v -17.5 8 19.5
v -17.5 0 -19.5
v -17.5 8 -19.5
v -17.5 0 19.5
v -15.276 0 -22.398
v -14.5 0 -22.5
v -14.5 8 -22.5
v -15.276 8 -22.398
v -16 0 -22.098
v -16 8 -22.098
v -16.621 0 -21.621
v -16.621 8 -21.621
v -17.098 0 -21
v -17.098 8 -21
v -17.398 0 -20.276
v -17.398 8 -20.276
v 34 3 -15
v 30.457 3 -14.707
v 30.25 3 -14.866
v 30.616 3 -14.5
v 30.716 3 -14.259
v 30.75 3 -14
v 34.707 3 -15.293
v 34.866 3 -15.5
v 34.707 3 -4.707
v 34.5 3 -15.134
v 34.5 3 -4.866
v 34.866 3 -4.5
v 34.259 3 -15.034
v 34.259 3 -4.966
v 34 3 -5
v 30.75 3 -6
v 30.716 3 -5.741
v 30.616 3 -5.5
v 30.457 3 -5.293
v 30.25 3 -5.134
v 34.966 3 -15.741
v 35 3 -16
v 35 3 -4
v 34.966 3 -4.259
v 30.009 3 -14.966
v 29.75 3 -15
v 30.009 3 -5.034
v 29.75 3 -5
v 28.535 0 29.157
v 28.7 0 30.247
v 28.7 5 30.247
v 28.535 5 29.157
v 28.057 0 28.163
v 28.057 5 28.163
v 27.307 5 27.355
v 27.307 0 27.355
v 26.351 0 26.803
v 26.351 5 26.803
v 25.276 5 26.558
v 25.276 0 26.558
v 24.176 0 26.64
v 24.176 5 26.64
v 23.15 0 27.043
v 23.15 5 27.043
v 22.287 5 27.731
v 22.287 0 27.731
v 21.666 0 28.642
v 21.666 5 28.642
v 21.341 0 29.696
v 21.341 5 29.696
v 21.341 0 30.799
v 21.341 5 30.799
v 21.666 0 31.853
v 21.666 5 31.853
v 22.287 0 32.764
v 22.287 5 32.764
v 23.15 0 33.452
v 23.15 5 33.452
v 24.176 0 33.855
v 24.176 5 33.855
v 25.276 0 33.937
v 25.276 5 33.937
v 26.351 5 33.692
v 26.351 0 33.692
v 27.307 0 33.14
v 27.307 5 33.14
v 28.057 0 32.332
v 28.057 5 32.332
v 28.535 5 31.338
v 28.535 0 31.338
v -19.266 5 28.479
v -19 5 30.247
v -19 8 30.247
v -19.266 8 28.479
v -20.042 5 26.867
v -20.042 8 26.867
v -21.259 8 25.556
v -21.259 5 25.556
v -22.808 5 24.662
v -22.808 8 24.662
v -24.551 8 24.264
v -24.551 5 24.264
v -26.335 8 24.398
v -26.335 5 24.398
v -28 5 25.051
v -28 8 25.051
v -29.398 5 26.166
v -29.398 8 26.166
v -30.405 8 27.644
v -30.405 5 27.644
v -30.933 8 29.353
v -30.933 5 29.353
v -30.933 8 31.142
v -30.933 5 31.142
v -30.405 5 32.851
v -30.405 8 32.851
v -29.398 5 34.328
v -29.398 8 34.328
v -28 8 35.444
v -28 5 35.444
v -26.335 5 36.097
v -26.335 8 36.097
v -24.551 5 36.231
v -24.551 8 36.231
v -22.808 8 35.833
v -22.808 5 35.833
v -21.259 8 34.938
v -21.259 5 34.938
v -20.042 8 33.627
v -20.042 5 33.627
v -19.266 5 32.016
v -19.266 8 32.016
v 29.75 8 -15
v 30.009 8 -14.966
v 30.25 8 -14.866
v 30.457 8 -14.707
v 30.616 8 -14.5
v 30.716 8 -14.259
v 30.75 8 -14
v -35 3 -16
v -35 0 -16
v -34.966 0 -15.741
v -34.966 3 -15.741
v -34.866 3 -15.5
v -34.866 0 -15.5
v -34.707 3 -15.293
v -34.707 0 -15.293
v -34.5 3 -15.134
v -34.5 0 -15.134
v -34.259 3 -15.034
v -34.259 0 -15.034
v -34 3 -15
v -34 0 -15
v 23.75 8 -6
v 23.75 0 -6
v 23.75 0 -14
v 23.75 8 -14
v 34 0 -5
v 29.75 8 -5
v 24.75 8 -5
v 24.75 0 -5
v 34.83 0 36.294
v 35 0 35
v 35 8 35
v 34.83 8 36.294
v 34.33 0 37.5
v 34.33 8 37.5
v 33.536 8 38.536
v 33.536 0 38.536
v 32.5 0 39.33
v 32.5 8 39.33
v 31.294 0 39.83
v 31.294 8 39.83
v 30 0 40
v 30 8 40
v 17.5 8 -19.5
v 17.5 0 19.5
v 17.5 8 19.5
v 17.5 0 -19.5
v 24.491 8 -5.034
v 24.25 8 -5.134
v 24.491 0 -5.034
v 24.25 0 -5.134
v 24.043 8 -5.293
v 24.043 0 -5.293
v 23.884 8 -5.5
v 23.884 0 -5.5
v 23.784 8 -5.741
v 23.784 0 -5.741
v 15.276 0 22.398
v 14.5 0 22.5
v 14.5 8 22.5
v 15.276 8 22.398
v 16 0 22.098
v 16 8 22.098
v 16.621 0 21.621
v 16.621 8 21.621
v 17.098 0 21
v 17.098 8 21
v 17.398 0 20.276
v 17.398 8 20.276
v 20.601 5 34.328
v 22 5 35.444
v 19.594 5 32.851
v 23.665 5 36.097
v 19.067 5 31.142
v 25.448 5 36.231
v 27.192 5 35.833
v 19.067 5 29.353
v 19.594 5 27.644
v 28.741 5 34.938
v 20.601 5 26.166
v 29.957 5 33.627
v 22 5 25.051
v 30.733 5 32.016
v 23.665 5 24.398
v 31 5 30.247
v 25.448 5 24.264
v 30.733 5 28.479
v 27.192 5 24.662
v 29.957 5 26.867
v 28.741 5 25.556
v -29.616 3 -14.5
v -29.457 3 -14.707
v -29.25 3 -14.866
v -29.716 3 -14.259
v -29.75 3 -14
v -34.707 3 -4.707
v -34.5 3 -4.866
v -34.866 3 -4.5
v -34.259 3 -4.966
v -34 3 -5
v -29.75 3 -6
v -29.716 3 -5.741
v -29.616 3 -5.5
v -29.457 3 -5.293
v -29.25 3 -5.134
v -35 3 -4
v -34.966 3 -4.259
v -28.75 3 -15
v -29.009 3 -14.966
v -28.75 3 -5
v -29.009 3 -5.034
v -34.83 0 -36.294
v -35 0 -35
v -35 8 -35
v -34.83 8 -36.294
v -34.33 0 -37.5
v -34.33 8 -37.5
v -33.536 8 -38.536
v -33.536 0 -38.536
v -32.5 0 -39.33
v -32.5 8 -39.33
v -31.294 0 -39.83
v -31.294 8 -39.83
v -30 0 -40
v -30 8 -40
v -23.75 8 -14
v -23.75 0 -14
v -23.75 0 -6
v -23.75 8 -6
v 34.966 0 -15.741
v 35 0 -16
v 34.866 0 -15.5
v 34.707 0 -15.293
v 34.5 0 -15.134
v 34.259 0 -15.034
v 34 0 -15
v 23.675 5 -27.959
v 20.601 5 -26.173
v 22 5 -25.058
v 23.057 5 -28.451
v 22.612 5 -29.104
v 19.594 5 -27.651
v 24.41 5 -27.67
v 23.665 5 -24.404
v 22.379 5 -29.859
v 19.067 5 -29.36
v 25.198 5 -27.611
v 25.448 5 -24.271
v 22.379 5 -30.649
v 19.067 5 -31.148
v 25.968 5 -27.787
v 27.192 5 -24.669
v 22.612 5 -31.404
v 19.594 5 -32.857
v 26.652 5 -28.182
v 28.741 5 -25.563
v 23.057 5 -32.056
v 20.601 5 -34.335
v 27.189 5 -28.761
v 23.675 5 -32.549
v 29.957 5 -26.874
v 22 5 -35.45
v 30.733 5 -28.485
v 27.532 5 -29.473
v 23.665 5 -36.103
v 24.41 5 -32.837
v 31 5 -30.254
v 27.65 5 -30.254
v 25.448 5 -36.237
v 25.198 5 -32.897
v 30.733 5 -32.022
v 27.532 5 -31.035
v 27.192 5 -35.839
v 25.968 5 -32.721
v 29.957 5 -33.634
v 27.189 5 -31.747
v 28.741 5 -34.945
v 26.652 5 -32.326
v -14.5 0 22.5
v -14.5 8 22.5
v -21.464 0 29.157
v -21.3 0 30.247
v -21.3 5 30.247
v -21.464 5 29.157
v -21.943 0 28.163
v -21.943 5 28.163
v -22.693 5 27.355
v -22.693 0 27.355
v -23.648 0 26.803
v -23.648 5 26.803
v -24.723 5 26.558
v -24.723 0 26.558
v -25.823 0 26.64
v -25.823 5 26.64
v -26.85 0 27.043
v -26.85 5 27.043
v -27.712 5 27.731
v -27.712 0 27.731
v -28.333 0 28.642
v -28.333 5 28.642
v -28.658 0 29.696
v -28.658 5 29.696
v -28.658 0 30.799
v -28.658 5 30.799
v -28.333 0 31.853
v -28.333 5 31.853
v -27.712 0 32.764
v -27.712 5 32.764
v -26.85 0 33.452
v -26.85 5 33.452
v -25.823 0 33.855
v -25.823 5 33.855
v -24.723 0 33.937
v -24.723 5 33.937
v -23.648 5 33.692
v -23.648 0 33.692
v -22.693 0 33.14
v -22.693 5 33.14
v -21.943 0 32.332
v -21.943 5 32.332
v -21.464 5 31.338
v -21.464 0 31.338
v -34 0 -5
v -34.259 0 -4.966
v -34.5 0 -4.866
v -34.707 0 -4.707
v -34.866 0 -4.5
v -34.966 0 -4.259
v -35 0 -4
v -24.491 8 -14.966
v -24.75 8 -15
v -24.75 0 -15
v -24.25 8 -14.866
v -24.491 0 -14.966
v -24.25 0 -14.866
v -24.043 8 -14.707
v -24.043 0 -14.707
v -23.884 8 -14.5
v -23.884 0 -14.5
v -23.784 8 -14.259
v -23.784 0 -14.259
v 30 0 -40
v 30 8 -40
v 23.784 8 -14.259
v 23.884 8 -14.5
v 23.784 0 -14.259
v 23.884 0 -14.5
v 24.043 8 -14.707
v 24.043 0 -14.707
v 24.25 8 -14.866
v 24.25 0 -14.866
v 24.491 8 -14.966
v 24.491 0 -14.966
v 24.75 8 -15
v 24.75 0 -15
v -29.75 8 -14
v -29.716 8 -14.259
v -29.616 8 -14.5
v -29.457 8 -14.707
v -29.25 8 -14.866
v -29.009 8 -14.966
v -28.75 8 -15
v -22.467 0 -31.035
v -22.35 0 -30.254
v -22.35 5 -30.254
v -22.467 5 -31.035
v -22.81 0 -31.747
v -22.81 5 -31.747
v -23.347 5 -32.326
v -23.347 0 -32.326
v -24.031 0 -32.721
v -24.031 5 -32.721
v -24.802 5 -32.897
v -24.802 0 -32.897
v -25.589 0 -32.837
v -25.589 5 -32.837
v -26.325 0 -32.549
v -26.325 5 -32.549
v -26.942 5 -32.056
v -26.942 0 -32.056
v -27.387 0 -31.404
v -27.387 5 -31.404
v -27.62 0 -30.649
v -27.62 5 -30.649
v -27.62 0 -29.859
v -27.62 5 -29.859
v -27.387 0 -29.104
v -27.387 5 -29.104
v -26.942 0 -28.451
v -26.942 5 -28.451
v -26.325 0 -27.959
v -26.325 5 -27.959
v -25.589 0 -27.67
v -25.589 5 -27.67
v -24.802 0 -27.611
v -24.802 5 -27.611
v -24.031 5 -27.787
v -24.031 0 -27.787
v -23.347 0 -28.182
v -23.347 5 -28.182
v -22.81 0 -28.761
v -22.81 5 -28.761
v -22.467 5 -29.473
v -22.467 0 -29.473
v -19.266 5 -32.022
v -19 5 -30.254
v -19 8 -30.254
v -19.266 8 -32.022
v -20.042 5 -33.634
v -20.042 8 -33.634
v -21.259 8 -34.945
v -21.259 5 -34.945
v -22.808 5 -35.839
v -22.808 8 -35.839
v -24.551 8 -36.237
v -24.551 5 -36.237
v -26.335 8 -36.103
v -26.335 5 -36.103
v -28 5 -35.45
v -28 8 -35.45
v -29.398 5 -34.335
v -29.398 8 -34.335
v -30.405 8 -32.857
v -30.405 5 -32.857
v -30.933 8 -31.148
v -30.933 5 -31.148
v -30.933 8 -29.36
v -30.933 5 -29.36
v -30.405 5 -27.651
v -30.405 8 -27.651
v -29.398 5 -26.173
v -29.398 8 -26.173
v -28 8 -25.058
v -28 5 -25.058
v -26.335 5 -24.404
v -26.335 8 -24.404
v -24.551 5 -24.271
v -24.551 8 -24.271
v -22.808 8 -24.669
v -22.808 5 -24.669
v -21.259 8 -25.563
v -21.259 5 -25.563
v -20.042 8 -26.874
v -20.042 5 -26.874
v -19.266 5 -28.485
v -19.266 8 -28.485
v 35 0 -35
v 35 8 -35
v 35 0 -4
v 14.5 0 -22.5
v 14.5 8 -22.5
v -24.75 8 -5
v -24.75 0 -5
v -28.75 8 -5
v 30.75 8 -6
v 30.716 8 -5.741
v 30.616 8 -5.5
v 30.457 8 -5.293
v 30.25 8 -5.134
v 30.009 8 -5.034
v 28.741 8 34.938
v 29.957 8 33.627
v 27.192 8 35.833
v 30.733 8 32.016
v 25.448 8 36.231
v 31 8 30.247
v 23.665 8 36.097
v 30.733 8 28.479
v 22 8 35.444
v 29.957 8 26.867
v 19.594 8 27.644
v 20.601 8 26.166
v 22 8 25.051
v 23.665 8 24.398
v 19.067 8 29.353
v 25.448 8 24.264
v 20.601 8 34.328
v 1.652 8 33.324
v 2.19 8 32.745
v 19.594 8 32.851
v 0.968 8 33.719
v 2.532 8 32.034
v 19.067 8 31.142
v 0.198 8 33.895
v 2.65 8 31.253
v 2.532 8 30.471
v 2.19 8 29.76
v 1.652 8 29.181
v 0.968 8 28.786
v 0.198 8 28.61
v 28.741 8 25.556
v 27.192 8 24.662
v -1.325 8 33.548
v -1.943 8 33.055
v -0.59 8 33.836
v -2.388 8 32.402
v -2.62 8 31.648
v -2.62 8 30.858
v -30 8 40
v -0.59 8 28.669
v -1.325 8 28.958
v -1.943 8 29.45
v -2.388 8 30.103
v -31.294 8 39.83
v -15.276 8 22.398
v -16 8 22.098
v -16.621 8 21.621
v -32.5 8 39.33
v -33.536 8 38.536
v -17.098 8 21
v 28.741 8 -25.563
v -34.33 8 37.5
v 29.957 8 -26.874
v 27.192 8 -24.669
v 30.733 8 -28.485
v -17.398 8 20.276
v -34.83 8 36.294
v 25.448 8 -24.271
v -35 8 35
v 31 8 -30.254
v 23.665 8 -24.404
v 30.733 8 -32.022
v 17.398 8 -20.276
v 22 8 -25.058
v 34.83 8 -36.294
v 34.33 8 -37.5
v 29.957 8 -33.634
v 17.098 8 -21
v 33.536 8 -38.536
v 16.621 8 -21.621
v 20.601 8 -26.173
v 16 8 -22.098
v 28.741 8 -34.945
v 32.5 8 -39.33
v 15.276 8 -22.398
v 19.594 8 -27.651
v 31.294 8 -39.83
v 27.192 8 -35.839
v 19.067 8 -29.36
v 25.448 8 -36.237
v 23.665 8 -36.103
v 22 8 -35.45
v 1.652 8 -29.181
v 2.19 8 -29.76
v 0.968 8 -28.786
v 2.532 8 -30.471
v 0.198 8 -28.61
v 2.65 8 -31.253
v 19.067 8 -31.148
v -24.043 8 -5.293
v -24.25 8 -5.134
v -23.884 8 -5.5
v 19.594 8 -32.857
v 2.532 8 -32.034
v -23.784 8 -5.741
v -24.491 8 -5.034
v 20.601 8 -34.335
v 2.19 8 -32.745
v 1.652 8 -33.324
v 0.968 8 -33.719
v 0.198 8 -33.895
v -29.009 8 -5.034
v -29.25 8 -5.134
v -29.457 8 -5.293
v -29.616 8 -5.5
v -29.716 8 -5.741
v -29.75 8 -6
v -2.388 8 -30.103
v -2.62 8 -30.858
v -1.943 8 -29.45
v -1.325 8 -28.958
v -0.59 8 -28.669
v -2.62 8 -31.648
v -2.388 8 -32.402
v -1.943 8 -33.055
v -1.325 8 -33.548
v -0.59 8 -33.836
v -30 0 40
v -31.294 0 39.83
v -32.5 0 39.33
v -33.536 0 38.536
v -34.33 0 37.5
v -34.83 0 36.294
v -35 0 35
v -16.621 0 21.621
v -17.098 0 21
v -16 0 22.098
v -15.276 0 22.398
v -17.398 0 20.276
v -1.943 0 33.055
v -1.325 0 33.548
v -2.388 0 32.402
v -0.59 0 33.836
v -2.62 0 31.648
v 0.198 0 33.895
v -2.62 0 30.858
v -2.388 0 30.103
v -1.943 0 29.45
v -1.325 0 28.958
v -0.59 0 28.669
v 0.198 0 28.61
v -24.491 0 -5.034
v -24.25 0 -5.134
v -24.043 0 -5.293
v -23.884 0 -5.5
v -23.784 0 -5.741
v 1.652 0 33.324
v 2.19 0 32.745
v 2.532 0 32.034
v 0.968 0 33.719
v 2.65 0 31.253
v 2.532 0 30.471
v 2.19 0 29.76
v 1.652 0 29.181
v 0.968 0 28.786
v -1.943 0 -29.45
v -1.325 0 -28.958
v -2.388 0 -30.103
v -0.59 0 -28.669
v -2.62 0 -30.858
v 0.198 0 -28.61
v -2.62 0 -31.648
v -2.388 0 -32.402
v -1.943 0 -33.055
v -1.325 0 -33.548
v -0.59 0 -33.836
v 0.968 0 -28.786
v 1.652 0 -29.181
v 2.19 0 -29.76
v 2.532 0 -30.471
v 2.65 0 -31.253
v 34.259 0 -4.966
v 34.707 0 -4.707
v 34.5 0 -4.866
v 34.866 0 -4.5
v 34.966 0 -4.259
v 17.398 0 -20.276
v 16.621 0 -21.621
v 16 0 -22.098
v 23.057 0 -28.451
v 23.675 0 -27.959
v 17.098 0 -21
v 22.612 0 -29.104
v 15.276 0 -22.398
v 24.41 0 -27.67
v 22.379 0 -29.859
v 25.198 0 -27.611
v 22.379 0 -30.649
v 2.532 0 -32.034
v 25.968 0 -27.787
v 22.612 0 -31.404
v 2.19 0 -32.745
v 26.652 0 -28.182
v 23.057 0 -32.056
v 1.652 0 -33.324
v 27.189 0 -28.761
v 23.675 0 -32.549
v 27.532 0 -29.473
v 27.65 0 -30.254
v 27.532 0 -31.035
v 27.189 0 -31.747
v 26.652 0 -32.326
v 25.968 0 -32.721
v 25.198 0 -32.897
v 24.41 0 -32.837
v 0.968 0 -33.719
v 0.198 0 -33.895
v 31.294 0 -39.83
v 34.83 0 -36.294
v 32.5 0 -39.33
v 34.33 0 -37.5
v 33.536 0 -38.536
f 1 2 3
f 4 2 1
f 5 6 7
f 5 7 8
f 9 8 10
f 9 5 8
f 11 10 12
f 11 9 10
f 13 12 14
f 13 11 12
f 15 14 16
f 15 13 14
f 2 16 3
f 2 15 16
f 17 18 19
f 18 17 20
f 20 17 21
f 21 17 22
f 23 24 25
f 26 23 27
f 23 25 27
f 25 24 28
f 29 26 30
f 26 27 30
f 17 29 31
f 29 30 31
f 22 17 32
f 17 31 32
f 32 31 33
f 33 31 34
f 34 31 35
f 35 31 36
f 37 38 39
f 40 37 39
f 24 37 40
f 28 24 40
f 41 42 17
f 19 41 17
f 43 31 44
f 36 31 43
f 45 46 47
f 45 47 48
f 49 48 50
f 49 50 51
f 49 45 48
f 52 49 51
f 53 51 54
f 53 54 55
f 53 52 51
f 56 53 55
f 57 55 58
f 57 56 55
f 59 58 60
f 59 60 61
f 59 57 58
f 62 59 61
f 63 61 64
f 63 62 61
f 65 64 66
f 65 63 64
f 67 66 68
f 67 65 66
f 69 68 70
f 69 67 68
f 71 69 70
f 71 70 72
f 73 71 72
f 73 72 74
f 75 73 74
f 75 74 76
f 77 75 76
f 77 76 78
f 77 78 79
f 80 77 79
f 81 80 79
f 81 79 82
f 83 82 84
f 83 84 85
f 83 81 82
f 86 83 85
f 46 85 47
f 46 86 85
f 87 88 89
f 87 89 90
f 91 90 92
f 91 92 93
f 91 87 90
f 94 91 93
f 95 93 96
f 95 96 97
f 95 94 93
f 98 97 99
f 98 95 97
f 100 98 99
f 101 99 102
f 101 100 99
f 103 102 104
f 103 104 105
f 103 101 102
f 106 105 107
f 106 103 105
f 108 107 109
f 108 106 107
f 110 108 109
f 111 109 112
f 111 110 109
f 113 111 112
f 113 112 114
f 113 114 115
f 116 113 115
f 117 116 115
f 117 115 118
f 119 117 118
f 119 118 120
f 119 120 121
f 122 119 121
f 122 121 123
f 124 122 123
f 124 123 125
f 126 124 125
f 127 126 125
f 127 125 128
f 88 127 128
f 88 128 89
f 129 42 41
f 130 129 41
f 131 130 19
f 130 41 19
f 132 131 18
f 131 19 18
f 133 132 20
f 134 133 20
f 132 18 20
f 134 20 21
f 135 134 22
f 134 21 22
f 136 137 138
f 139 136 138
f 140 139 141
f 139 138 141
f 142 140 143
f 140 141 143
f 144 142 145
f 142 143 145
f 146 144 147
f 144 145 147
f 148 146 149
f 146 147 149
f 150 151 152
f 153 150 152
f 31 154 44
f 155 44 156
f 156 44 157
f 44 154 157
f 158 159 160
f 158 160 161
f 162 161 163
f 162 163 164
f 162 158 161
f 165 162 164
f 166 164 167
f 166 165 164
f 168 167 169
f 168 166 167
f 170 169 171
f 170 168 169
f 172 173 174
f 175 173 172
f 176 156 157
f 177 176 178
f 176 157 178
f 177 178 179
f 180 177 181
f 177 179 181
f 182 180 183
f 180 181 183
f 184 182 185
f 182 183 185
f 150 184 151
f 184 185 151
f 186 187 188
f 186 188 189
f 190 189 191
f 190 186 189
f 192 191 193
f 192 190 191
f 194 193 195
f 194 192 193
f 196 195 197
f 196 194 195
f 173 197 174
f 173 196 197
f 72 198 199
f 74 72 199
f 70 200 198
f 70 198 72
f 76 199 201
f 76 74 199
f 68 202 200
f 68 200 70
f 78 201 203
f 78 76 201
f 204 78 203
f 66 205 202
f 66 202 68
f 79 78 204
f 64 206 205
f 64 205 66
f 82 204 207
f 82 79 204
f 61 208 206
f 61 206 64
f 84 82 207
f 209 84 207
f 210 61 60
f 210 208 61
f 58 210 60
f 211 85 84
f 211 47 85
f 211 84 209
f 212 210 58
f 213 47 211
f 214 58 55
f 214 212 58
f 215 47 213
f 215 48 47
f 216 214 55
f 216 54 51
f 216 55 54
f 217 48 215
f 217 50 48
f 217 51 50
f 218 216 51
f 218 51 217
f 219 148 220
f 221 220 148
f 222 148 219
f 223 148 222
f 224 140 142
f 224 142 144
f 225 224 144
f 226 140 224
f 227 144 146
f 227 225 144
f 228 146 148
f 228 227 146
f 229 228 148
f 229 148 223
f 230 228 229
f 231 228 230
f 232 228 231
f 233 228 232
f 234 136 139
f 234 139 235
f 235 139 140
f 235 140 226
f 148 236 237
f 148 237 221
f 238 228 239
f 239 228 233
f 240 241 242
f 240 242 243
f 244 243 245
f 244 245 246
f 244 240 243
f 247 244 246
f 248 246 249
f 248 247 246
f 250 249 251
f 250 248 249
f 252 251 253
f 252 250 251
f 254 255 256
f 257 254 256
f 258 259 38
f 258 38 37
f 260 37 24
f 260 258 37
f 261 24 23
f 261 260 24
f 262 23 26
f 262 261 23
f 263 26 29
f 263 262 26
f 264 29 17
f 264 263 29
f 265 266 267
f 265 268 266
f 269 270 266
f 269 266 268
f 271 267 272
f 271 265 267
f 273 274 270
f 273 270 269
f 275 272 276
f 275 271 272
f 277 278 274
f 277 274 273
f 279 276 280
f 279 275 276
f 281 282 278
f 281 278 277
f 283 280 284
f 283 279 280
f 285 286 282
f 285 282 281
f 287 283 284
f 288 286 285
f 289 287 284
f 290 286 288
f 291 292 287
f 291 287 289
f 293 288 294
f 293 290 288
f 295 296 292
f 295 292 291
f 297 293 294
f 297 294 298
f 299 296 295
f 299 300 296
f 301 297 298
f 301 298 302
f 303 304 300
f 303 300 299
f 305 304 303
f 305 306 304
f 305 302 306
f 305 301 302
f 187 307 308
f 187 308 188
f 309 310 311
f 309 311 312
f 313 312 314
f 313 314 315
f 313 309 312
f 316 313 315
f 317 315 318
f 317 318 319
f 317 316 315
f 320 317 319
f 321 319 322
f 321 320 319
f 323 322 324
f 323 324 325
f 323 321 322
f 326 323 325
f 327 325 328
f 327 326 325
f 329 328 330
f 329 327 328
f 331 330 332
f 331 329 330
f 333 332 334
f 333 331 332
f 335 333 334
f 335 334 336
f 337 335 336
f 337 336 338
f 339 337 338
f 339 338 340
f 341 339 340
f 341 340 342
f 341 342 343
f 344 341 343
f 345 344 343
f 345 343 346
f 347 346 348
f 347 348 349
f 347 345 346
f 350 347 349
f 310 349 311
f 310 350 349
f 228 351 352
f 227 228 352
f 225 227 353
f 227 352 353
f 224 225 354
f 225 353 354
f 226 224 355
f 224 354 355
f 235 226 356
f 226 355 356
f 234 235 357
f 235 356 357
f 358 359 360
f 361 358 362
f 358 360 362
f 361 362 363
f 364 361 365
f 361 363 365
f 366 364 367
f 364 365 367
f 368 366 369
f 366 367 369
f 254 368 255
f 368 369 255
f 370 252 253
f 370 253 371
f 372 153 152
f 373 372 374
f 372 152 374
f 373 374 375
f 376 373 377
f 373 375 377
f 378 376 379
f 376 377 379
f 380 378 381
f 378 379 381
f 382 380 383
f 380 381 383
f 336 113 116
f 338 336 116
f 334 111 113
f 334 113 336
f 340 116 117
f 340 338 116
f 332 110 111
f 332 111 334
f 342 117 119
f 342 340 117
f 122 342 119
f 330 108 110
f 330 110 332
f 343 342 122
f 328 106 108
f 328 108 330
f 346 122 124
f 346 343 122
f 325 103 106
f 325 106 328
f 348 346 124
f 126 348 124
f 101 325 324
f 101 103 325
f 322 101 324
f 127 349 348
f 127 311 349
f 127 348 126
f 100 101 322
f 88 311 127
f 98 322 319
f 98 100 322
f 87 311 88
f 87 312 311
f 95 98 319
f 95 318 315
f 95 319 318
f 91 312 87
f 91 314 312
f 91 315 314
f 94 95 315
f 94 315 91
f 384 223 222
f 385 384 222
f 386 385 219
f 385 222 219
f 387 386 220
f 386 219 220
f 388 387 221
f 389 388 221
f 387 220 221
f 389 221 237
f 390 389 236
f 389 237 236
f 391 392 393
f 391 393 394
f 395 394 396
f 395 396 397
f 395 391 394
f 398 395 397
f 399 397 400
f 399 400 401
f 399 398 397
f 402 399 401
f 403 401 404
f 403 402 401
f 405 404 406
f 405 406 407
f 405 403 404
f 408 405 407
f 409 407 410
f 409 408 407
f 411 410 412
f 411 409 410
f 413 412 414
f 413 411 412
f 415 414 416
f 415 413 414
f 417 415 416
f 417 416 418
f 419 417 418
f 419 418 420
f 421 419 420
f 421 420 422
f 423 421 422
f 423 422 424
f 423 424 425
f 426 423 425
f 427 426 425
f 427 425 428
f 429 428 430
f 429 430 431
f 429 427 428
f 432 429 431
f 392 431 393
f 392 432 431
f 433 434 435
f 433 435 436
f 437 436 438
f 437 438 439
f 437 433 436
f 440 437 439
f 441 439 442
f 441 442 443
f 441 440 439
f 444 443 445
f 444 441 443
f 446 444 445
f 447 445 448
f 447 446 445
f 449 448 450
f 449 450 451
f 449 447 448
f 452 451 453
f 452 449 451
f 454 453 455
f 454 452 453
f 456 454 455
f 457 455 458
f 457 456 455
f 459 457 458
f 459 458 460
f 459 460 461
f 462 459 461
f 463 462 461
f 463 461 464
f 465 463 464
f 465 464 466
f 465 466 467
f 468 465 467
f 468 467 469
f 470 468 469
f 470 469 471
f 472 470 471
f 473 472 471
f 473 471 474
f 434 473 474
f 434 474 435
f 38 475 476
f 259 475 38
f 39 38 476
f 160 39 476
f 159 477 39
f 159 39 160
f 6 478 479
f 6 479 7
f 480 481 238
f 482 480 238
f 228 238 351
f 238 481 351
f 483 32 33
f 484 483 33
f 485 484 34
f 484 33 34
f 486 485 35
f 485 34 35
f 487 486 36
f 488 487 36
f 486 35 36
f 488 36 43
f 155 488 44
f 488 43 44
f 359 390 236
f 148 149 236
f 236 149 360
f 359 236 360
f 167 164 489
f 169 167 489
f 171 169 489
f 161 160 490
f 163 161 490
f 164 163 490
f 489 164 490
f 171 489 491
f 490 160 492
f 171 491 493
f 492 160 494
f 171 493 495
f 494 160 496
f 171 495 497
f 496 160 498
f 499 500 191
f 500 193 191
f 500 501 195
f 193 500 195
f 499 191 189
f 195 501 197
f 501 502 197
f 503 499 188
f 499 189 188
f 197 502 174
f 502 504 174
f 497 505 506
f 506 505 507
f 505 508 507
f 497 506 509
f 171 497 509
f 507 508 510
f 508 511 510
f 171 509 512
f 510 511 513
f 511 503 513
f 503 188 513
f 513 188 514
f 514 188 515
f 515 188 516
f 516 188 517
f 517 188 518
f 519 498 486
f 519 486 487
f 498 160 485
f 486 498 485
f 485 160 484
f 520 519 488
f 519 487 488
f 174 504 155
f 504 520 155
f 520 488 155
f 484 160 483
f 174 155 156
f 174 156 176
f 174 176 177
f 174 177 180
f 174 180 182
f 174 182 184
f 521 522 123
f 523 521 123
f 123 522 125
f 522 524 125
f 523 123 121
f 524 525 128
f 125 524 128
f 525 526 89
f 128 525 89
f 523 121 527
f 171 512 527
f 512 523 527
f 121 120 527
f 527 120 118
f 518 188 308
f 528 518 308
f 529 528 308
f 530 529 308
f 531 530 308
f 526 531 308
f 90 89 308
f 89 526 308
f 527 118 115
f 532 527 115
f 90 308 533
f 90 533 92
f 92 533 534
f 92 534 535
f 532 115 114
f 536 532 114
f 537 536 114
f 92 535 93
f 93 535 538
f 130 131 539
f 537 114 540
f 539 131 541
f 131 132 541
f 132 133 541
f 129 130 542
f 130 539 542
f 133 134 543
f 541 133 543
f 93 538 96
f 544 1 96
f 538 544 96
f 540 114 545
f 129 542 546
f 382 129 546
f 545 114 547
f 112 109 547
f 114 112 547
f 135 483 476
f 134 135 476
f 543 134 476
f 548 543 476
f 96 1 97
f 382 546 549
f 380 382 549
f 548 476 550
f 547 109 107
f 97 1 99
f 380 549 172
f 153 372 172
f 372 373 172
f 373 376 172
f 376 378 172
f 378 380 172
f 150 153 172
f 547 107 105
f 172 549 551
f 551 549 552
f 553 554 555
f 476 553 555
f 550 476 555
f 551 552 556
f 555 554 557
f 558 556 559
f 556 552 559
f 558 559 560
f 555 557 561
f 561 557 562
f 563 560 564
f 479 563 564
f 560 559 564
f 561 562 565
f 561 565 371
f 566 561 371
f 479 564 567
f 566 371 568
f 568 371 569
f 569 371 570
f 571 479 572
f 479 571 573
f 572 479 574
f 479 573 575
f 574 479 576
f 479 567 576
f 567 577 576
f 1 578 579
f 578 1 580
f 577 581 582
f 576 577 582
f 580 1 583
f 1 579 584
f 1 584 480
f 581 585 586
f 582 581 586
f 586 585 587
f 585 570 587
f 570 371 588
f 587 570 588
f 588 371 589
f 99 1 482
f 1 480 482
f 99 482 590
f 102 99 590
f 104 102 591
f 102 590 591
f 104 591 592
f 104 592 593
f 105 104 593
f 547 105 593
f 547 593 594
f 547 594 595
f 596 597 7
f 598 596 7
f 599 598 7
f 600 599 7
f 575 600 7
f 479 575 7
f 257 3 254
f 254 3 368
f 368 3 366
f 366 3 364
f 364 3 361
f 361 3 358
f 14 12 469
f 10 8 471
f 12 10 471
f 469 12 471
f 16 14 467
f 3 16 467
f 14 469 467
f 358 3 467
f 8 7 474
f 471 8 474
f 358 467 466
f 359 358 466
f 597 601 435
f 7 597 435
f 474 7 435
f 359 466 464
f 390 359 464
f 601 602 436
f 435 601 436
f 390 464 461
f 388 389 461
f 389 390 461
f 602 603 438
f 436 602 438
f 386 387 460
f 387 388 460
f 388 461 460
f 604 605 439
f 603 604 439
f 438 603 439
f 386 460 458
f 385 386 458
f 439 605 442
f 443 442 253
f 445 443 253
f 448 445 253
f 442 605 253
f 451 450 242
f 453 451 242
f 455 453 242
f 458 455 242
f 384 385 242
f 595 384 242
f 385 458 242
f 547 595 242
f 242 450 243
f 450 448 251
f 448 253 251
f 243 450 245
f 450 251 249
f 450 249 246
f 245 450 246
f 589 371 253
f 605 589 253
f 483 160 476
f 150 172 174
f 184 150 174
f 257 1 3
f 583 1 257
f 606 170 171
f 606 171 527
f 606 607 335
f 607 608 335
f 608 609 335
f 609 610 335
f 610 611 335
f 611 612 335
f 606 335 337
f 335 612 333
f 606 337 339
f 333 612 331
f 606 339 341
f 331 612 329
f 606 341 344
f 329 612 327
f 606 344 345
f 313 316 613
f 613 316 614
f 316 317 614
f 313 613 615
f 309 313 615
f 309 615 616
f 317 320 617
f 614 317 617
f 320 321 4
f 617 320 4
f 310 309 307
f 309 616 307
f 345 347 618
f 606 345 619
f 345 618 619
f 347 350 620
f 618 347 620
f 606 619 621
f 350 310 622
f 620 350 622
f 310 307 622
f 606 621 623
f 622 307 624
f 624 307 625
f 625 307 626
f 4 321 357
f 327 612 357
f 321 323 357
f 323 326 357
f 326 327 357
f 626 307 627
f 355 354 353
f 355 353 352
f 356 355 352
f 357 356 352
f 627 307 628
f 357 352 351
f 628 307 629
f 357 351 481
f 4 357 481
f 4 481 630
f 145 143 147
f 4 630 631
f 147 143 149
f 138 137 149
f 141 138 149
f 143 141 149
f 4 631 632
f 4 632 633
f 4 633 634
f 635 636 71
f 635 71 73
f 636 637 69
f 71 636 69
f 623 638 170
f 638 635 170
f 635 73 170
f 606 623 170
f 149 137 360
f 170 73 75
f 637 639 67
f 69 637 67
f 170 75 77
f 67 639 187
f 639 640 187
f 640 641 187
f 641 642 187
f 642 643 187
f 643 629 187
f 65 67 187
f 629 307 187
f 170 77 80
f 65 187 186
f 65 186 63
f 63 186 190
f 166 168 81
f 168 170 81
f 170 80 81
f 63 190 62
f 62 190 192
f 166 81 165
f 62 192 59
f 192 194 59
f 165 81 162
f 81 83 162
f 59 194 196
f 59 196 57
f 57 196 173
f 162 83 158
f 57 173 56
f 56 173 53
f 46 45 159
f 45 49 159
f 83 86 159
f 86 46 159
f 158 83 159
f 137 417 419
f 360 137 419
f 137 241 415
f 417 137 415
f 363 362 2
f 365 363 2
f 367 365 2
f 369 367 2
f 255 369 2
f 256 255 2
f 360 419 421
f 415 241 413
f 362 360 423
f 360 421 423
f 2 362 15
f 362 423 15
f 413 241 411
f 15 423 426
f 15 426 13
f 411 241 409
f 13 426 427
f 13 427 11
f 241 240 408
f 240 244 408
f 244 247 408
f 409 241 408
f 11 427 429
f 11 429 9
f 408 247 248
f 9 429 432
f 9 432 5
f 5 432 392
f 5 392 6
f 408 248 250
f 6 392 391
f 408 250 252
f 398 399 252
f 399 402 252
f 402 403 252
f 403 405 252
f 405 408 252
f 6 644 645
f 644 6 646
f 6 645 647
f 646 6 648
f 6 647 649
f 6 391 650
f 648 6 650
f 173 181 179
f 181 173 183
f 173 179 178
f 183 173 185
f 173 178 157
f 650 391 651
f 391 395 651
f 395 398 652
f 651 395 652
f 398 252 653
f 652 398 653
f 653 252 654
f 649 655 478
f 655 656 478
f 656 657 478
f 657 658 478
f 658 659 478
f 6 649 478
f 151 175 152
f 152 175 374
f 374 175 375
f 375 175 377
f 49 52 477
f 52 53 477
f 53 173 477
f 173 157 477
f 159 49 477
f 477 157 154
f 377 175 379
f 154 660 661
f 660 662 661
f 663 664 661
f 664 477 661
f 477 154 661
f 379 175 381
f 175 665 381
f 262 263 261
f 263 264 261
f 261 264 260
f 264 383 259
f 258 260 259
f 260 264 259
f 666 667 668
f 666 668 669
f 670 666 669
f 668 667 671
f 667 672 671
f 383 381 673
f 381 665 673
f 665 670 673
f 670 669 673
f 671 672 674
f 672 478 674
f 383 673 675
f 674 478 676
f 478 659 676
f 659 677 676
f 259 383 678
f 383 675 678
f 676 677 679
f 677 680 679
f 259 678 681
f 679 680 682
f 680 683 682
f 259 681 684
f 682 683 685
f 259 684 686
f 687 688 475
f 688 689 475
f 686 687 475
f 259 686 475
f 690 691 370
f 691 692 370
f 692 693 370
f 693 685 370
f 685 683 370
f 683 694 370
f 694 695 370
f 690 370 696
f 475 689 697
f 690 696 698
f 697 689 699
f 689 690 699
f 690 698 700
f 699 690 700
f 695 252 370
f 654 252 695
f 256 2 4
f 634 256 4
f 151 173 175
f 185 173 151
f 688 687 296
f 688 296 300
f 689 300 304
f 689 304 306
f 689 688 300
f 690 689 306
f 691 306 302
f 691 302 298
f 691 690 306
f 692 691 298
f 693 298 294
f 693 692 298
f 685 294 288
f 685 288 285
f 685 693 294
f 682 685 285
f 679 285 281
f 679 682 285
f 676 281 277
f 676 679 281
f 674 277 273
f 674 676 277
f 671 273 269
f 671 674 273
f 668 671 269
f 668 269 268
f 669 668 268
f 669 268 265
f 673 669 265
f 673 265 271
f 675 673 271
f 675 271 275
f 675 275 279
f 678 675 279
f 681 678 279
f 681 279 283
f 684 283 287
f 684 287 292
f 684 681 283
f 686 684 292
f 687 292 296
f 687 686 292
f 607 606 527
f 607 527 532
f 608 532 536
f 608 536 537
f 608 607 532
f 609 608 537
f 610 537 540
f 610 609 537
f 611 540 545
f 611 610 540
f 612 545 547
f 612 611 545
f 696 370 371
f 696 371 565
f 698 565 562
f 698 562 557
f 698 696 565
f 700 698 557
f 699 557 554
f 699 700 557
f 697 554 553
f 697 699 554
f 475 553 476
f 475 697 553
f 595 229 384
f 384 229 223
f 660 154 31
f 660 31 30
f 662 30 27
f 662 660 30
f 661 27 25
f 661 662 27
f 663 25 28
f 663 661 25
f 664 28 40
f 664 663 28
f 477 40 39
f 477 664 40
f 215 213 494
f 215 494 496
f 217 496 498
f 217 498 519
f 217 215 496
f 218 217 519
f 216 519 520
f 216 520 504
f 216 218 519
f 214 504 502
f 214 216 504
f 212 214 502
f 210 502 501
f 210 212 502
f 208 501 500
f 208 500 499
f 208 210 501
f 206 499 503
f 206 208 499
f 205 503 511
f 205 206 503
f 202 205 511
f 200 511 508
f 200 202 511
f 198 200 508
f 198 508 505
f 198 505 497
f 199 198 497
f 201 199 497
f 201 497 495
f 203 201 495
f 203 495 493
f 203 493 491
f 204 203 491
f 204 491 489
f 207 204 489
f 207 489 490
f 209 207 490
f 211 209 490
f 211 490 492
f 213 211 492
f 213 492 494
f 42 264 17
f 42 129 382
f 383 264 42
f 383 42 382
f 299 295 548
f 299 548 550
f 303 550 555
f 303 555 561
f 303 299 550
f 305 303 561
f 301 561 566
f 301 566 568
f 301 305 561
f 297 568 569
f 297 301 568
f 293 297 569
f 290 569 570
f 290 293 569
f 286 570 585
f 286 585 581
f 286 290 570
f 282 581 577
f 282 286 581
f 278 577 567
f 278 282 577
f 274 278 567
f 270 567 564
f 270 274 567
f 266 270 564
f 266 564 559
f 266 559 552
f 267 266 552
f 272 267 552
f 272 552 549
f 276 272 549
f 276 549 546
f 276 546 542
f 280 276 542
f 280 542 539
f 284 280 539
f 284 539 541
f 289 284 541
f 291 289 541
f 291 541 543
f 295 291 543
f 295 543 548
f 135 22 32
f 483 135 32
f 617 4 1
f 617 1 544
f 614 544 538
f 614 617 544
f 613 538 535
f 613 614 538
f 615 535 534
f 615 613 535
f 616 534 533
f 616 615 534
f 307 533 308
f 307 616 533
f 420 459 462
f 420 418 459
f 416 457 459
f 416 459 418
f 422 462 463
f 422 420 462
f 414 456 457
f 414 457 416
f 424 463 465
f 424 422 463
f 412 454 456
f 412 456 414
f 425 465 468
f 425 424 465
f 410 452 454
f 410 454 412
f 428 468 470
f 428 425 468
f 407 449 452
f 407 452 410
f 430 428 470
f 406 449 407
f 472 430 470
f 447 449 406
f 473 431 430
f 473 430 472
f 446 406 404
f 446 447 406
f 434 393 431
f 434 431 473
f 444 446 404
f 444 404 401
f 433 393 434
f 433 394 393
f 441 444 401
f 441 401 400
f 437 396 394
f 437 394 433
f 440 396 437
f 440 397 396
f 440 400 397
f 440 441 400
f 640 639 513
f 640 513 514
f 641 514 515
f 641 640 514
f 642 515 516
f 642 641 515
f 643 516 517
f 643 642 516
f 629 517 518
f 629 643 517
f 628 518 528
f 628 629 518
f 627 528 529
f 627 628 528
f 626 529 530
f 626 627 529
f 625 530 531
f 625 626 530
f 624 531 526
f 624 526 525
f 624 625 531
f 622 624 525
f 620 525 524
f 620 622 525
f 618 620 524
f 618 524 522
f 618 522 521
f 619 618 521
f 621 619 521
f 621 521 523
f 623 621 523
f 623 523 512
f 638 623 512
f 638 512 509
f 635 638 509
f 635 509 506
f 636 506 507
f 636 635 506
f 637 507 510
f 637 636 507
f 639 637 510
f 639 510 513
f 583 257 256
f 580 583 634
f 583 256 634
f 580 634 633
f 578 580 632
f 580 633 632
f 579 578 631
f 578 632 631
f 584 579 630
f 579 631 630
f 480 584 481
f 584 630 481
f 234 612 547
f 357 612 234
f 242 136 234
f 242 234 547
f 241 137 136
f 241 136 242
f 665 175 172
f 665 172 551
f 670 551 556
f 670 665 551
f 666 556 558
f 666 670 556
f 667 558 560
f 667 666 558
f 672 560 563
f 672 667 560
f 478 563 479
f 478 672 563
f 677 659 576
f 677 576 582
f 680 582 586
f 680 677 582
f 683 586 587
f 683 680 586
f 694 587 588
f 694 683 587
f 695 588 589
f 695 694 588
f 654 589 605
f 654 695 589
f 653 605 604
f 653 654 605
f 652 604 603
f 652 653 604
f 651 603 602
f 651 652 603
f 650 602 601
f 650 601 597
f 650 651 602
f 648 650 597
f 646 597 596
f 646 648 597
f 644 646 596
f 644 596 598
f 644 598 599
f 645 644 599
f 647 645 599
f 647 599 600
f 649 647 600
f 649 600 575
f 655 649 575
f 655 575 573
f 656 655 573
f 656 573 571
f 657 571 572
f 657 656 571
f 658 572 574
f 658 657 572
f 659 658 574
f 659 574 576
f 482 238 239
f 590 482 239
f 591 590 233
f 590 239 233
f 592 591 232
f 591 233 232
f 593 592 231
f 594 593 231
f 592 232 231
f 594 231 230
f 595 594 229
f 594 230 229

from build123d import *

# Parameters (mm, degrees)
CROQUIS1_R              = 6
CROQUIS1_R_2            = 2.65
SALIENTE_EXTRUIR1_DEPTH = 8
CROQUIS1_4_R            = 6
CROQUIS1_4_R_2          = 3.7
CROQUIS1_4_R_3          = 2.65
SALIENTE_EXTRUIR2_DEPTH = 5
CROQUIS1_6_R            = 3.7
CROQUIS1_6_R_2          = 2.65
CORTAR_EXTRUIR1_DEPTH   = 5
CORTAR_EXTRUIR2_DEPTH   = 3


with BuildPart() as part:
    # Croquis1 → Saliente-Extruir1 (new body)
    with BuildSketch(Plane(origin=(0, 0, 0), x_dir=(1, 0, 0), z_dir=(0, 1, 0))):
        with BuildLine():
            Line((-35, 35), (-35, -35))
            ThreePointArc((-35, -35), (-33.535533906, -38.535533906), (-30, -40))
            Line((-30, -40), (30, -40))
            ThreePointArc((30, -40), (33.535533906, -38.535533906), (35, -35))
            Line((35, -35), (35, 35))
            ThreePointArc((35, 35), (33.535533906, 38.535533906), (30, 40))
            Line((30, 40), (-30, 40))
            ThreePointArc((-30, 40), (-33.535533906, 38.535533906), (-35, 35))
        make_face()
        with Locations((-24.99964, -30.24738)):
            Circle(CROQUIS1_R, mode=Mode.SUBTRACT)
        with Locations((0, -31.2526)):
            Circle(CROQUIS1_R_2, mode=Mode.SUBTRACT)
        with Locations((24.99964, -30.24738)):
            Circle(CROQUIS1_R, mode=Mode.SUBTRACT)
        with BuildLine():
            ThreePointArc((-29.75, 14), (-29.457106781, 14.707106781), (-28.75, 15))
            Line((-28.75, 15), (-24.75, 15))
            ThreePointArc((-24.75, 15), (-24.042893219, 14.707106781), (-23.75, 14))
            Line((-23.75, 14), (-23.75, 6))
            ThreePointArc((-23.75, 6), (-24.042893219, 5.292893219), (-24.75, 5))
            Line((-24.75, 5), (-28.75, 5))
            ThreePointArc((-28.75, 5), (-29.457106781, 5.292893219), (-29.75, 6))
            Line((-29.75, 6), (-29.75, 14))
        make_face(mode=Mode.SUBTRACT)
        with Locations((-24.99964, 30.25392)):
            Circle(CROQUIS1_R, mode=Mode.SUBTRACT)
        with BuildLine():
            Line((14.5, -22.5), (-14.5, -22.5))
            ThreePointArc((-14.5, -22.5), (-16.621320344, -21.621320344), (-17.5, -19.5))
            Line((-17.5, -19.5), (-17.5, 19.5))
            ThreePointArc((-17.5, 19.5), (-16.621320344, 21.621320344), (-14.5, 22.5))
            Line((-14.5, 22.5), (14.5, 22.5))
            ThreePointArc((14.5, 22.5), (16.621320344, 21.621320344), (17.5, 19.5))
            Line((17.5, 19.5), (17.5, -19.5))
            ThreePointArc((17.5, -19.5), (16.621320344, -21.621320344), (14.5, -22.5))
        make_face(mode=Mode.SUBTRACT)
        with BuildLine():
            ThreePointArc((23.75, 14), (24.042893219, 14.707106781), (24.75, 15))
            Line((24.75, 15), (29.75, 15))
            ThreePointArc((29.75, 15), (30.457106781, 14.707106781), (30.75, 14))
            Line((30.75, 14), (30.75, 6))
            ThreePointArc((30.75, 6), (30.457106781, 5.292893219), (29.75, 5))
            Line((29.75, 5), (24.75, 5))
            ThreePointArc((24.75, 5), (24.042893219, 5.292893219), (23.75, 6))
            Line((23.75, 6), (23.75, 14))
        make_face(mode=Mode.SUBTRACT)
        with Locations((0, 31.2526)):
            Circle(CROQUIS1_R_2, mode=Mode.SUBTRACT)
        with Locations((24.99964, 30.25392)):
            Circle(CROQUIS1_R, mode=Mode.SUBTRACT)
    extrude(amount=SALIENTE_EXTRUIR1_DEPTH)

    # Croquis1<4> → Saliente-Extruir2 (add)
    # profile 1 of 4: a face of its own
    with BuildSketch(Plane(origin=(0, 0, 0), x_dir=(1, 0, 0), z_dir=(0, 1, 0))):
        with Locations((-24.99964, -30.24738)):
            Circle(CROQUIS1_4_R)
        with Locations((-24.99964, -30.24738)):
            Circle(CROQUIS1_4_R_2, mode=Mode.SUBTRACT)
    # profile 2 of 4: a face of its own
    with BuildSketch(Plane(origin=(0, 0, 0), x_dir=(1, 0, 0), z_dir=(0, 1, 0))):
        with Locations((-24.99964, 30.25392)):
            Circle(CROQUIS1_4_R)
        with Locations((-24.99964, 30.25392)):
            Circle(CROQUIS1_4_R_3, mode=Mode.SUBTRACT)
    # profile 3 of 4: a face of its own
    with BuildSketch(Plane(origin=(0, 0, 0), x_dir=(1, 0, 0), z_dir=(0, 1, 0))):
        with Locations((24.99964, -30.24738)):
            Circle(CROQUIS1_4_R)
    # profile 4 of 4: a face of its own
    with BuildSketch(Plane(origin=(0, 0, 0), x_dir=(1, 0, 0), z_dir=(0, 1, 0))):
        with Locations((24.99964, 30.25392)):
            Circle(CROQUIS1_4_R)
    extrude(amount=SALIENTE_EXTRUIR2_DEPTH)

    # Croquis1<6> → Cortar-Extruir1 (cut)
    with BuildSketch(Plane(origin=(0, 0, 0), x_dir=(1, 0, 0), z_dir=(0, 1, 0))):
        with Locations((24.99964, -30.24738)):
            Circle(CROQUIS1_6_R)
        with Locations((24.99964, 30.25392)):
            Circle(CROQUIS1_6_R_2)
    extrude(amount=CORTAR_EXTRUIR1_DEPTH, mode=Mode.SUBTRACT)

    # Croquis3 → Cortar-Extruir2 (cut)
    with BuildSketch(Plane.XZ):
        with BuildLine():
            Line((-35, -4), (-35, -16))
            ThreePointArc((-35, -16), (-34.707106781, -15.292893219), (-34, -15))
            Line((-34, -15), (-28.75, -15))
            Line((-28.75, -15), (-28.75, -5))
            Line((-28.75, -5), (-34, -5))
            ThreePointArc((-34, -5), (-34.707106781, -4.707106781), (-35, -4))
        make_face()
        with BuildLine():
            Line((35, -4), (35, -16))
            ThreePointArc((35, -16), (34.707106781, -15.292893219), (34, -15))
            Line((34, -15), (29.75, -15))
            Line((29.75, -15), (29.75, -5))
            Line((29.75, -5), (34, -5))
            ThreePointArc((34, -5), (34.707106781, -4.707106781), (35, -4))
        make_face()
    extrude(amount=-CORTAR_EXTRUIR2_DEPTH, mode=Mode.SUBTRACT)


solid = part.part
